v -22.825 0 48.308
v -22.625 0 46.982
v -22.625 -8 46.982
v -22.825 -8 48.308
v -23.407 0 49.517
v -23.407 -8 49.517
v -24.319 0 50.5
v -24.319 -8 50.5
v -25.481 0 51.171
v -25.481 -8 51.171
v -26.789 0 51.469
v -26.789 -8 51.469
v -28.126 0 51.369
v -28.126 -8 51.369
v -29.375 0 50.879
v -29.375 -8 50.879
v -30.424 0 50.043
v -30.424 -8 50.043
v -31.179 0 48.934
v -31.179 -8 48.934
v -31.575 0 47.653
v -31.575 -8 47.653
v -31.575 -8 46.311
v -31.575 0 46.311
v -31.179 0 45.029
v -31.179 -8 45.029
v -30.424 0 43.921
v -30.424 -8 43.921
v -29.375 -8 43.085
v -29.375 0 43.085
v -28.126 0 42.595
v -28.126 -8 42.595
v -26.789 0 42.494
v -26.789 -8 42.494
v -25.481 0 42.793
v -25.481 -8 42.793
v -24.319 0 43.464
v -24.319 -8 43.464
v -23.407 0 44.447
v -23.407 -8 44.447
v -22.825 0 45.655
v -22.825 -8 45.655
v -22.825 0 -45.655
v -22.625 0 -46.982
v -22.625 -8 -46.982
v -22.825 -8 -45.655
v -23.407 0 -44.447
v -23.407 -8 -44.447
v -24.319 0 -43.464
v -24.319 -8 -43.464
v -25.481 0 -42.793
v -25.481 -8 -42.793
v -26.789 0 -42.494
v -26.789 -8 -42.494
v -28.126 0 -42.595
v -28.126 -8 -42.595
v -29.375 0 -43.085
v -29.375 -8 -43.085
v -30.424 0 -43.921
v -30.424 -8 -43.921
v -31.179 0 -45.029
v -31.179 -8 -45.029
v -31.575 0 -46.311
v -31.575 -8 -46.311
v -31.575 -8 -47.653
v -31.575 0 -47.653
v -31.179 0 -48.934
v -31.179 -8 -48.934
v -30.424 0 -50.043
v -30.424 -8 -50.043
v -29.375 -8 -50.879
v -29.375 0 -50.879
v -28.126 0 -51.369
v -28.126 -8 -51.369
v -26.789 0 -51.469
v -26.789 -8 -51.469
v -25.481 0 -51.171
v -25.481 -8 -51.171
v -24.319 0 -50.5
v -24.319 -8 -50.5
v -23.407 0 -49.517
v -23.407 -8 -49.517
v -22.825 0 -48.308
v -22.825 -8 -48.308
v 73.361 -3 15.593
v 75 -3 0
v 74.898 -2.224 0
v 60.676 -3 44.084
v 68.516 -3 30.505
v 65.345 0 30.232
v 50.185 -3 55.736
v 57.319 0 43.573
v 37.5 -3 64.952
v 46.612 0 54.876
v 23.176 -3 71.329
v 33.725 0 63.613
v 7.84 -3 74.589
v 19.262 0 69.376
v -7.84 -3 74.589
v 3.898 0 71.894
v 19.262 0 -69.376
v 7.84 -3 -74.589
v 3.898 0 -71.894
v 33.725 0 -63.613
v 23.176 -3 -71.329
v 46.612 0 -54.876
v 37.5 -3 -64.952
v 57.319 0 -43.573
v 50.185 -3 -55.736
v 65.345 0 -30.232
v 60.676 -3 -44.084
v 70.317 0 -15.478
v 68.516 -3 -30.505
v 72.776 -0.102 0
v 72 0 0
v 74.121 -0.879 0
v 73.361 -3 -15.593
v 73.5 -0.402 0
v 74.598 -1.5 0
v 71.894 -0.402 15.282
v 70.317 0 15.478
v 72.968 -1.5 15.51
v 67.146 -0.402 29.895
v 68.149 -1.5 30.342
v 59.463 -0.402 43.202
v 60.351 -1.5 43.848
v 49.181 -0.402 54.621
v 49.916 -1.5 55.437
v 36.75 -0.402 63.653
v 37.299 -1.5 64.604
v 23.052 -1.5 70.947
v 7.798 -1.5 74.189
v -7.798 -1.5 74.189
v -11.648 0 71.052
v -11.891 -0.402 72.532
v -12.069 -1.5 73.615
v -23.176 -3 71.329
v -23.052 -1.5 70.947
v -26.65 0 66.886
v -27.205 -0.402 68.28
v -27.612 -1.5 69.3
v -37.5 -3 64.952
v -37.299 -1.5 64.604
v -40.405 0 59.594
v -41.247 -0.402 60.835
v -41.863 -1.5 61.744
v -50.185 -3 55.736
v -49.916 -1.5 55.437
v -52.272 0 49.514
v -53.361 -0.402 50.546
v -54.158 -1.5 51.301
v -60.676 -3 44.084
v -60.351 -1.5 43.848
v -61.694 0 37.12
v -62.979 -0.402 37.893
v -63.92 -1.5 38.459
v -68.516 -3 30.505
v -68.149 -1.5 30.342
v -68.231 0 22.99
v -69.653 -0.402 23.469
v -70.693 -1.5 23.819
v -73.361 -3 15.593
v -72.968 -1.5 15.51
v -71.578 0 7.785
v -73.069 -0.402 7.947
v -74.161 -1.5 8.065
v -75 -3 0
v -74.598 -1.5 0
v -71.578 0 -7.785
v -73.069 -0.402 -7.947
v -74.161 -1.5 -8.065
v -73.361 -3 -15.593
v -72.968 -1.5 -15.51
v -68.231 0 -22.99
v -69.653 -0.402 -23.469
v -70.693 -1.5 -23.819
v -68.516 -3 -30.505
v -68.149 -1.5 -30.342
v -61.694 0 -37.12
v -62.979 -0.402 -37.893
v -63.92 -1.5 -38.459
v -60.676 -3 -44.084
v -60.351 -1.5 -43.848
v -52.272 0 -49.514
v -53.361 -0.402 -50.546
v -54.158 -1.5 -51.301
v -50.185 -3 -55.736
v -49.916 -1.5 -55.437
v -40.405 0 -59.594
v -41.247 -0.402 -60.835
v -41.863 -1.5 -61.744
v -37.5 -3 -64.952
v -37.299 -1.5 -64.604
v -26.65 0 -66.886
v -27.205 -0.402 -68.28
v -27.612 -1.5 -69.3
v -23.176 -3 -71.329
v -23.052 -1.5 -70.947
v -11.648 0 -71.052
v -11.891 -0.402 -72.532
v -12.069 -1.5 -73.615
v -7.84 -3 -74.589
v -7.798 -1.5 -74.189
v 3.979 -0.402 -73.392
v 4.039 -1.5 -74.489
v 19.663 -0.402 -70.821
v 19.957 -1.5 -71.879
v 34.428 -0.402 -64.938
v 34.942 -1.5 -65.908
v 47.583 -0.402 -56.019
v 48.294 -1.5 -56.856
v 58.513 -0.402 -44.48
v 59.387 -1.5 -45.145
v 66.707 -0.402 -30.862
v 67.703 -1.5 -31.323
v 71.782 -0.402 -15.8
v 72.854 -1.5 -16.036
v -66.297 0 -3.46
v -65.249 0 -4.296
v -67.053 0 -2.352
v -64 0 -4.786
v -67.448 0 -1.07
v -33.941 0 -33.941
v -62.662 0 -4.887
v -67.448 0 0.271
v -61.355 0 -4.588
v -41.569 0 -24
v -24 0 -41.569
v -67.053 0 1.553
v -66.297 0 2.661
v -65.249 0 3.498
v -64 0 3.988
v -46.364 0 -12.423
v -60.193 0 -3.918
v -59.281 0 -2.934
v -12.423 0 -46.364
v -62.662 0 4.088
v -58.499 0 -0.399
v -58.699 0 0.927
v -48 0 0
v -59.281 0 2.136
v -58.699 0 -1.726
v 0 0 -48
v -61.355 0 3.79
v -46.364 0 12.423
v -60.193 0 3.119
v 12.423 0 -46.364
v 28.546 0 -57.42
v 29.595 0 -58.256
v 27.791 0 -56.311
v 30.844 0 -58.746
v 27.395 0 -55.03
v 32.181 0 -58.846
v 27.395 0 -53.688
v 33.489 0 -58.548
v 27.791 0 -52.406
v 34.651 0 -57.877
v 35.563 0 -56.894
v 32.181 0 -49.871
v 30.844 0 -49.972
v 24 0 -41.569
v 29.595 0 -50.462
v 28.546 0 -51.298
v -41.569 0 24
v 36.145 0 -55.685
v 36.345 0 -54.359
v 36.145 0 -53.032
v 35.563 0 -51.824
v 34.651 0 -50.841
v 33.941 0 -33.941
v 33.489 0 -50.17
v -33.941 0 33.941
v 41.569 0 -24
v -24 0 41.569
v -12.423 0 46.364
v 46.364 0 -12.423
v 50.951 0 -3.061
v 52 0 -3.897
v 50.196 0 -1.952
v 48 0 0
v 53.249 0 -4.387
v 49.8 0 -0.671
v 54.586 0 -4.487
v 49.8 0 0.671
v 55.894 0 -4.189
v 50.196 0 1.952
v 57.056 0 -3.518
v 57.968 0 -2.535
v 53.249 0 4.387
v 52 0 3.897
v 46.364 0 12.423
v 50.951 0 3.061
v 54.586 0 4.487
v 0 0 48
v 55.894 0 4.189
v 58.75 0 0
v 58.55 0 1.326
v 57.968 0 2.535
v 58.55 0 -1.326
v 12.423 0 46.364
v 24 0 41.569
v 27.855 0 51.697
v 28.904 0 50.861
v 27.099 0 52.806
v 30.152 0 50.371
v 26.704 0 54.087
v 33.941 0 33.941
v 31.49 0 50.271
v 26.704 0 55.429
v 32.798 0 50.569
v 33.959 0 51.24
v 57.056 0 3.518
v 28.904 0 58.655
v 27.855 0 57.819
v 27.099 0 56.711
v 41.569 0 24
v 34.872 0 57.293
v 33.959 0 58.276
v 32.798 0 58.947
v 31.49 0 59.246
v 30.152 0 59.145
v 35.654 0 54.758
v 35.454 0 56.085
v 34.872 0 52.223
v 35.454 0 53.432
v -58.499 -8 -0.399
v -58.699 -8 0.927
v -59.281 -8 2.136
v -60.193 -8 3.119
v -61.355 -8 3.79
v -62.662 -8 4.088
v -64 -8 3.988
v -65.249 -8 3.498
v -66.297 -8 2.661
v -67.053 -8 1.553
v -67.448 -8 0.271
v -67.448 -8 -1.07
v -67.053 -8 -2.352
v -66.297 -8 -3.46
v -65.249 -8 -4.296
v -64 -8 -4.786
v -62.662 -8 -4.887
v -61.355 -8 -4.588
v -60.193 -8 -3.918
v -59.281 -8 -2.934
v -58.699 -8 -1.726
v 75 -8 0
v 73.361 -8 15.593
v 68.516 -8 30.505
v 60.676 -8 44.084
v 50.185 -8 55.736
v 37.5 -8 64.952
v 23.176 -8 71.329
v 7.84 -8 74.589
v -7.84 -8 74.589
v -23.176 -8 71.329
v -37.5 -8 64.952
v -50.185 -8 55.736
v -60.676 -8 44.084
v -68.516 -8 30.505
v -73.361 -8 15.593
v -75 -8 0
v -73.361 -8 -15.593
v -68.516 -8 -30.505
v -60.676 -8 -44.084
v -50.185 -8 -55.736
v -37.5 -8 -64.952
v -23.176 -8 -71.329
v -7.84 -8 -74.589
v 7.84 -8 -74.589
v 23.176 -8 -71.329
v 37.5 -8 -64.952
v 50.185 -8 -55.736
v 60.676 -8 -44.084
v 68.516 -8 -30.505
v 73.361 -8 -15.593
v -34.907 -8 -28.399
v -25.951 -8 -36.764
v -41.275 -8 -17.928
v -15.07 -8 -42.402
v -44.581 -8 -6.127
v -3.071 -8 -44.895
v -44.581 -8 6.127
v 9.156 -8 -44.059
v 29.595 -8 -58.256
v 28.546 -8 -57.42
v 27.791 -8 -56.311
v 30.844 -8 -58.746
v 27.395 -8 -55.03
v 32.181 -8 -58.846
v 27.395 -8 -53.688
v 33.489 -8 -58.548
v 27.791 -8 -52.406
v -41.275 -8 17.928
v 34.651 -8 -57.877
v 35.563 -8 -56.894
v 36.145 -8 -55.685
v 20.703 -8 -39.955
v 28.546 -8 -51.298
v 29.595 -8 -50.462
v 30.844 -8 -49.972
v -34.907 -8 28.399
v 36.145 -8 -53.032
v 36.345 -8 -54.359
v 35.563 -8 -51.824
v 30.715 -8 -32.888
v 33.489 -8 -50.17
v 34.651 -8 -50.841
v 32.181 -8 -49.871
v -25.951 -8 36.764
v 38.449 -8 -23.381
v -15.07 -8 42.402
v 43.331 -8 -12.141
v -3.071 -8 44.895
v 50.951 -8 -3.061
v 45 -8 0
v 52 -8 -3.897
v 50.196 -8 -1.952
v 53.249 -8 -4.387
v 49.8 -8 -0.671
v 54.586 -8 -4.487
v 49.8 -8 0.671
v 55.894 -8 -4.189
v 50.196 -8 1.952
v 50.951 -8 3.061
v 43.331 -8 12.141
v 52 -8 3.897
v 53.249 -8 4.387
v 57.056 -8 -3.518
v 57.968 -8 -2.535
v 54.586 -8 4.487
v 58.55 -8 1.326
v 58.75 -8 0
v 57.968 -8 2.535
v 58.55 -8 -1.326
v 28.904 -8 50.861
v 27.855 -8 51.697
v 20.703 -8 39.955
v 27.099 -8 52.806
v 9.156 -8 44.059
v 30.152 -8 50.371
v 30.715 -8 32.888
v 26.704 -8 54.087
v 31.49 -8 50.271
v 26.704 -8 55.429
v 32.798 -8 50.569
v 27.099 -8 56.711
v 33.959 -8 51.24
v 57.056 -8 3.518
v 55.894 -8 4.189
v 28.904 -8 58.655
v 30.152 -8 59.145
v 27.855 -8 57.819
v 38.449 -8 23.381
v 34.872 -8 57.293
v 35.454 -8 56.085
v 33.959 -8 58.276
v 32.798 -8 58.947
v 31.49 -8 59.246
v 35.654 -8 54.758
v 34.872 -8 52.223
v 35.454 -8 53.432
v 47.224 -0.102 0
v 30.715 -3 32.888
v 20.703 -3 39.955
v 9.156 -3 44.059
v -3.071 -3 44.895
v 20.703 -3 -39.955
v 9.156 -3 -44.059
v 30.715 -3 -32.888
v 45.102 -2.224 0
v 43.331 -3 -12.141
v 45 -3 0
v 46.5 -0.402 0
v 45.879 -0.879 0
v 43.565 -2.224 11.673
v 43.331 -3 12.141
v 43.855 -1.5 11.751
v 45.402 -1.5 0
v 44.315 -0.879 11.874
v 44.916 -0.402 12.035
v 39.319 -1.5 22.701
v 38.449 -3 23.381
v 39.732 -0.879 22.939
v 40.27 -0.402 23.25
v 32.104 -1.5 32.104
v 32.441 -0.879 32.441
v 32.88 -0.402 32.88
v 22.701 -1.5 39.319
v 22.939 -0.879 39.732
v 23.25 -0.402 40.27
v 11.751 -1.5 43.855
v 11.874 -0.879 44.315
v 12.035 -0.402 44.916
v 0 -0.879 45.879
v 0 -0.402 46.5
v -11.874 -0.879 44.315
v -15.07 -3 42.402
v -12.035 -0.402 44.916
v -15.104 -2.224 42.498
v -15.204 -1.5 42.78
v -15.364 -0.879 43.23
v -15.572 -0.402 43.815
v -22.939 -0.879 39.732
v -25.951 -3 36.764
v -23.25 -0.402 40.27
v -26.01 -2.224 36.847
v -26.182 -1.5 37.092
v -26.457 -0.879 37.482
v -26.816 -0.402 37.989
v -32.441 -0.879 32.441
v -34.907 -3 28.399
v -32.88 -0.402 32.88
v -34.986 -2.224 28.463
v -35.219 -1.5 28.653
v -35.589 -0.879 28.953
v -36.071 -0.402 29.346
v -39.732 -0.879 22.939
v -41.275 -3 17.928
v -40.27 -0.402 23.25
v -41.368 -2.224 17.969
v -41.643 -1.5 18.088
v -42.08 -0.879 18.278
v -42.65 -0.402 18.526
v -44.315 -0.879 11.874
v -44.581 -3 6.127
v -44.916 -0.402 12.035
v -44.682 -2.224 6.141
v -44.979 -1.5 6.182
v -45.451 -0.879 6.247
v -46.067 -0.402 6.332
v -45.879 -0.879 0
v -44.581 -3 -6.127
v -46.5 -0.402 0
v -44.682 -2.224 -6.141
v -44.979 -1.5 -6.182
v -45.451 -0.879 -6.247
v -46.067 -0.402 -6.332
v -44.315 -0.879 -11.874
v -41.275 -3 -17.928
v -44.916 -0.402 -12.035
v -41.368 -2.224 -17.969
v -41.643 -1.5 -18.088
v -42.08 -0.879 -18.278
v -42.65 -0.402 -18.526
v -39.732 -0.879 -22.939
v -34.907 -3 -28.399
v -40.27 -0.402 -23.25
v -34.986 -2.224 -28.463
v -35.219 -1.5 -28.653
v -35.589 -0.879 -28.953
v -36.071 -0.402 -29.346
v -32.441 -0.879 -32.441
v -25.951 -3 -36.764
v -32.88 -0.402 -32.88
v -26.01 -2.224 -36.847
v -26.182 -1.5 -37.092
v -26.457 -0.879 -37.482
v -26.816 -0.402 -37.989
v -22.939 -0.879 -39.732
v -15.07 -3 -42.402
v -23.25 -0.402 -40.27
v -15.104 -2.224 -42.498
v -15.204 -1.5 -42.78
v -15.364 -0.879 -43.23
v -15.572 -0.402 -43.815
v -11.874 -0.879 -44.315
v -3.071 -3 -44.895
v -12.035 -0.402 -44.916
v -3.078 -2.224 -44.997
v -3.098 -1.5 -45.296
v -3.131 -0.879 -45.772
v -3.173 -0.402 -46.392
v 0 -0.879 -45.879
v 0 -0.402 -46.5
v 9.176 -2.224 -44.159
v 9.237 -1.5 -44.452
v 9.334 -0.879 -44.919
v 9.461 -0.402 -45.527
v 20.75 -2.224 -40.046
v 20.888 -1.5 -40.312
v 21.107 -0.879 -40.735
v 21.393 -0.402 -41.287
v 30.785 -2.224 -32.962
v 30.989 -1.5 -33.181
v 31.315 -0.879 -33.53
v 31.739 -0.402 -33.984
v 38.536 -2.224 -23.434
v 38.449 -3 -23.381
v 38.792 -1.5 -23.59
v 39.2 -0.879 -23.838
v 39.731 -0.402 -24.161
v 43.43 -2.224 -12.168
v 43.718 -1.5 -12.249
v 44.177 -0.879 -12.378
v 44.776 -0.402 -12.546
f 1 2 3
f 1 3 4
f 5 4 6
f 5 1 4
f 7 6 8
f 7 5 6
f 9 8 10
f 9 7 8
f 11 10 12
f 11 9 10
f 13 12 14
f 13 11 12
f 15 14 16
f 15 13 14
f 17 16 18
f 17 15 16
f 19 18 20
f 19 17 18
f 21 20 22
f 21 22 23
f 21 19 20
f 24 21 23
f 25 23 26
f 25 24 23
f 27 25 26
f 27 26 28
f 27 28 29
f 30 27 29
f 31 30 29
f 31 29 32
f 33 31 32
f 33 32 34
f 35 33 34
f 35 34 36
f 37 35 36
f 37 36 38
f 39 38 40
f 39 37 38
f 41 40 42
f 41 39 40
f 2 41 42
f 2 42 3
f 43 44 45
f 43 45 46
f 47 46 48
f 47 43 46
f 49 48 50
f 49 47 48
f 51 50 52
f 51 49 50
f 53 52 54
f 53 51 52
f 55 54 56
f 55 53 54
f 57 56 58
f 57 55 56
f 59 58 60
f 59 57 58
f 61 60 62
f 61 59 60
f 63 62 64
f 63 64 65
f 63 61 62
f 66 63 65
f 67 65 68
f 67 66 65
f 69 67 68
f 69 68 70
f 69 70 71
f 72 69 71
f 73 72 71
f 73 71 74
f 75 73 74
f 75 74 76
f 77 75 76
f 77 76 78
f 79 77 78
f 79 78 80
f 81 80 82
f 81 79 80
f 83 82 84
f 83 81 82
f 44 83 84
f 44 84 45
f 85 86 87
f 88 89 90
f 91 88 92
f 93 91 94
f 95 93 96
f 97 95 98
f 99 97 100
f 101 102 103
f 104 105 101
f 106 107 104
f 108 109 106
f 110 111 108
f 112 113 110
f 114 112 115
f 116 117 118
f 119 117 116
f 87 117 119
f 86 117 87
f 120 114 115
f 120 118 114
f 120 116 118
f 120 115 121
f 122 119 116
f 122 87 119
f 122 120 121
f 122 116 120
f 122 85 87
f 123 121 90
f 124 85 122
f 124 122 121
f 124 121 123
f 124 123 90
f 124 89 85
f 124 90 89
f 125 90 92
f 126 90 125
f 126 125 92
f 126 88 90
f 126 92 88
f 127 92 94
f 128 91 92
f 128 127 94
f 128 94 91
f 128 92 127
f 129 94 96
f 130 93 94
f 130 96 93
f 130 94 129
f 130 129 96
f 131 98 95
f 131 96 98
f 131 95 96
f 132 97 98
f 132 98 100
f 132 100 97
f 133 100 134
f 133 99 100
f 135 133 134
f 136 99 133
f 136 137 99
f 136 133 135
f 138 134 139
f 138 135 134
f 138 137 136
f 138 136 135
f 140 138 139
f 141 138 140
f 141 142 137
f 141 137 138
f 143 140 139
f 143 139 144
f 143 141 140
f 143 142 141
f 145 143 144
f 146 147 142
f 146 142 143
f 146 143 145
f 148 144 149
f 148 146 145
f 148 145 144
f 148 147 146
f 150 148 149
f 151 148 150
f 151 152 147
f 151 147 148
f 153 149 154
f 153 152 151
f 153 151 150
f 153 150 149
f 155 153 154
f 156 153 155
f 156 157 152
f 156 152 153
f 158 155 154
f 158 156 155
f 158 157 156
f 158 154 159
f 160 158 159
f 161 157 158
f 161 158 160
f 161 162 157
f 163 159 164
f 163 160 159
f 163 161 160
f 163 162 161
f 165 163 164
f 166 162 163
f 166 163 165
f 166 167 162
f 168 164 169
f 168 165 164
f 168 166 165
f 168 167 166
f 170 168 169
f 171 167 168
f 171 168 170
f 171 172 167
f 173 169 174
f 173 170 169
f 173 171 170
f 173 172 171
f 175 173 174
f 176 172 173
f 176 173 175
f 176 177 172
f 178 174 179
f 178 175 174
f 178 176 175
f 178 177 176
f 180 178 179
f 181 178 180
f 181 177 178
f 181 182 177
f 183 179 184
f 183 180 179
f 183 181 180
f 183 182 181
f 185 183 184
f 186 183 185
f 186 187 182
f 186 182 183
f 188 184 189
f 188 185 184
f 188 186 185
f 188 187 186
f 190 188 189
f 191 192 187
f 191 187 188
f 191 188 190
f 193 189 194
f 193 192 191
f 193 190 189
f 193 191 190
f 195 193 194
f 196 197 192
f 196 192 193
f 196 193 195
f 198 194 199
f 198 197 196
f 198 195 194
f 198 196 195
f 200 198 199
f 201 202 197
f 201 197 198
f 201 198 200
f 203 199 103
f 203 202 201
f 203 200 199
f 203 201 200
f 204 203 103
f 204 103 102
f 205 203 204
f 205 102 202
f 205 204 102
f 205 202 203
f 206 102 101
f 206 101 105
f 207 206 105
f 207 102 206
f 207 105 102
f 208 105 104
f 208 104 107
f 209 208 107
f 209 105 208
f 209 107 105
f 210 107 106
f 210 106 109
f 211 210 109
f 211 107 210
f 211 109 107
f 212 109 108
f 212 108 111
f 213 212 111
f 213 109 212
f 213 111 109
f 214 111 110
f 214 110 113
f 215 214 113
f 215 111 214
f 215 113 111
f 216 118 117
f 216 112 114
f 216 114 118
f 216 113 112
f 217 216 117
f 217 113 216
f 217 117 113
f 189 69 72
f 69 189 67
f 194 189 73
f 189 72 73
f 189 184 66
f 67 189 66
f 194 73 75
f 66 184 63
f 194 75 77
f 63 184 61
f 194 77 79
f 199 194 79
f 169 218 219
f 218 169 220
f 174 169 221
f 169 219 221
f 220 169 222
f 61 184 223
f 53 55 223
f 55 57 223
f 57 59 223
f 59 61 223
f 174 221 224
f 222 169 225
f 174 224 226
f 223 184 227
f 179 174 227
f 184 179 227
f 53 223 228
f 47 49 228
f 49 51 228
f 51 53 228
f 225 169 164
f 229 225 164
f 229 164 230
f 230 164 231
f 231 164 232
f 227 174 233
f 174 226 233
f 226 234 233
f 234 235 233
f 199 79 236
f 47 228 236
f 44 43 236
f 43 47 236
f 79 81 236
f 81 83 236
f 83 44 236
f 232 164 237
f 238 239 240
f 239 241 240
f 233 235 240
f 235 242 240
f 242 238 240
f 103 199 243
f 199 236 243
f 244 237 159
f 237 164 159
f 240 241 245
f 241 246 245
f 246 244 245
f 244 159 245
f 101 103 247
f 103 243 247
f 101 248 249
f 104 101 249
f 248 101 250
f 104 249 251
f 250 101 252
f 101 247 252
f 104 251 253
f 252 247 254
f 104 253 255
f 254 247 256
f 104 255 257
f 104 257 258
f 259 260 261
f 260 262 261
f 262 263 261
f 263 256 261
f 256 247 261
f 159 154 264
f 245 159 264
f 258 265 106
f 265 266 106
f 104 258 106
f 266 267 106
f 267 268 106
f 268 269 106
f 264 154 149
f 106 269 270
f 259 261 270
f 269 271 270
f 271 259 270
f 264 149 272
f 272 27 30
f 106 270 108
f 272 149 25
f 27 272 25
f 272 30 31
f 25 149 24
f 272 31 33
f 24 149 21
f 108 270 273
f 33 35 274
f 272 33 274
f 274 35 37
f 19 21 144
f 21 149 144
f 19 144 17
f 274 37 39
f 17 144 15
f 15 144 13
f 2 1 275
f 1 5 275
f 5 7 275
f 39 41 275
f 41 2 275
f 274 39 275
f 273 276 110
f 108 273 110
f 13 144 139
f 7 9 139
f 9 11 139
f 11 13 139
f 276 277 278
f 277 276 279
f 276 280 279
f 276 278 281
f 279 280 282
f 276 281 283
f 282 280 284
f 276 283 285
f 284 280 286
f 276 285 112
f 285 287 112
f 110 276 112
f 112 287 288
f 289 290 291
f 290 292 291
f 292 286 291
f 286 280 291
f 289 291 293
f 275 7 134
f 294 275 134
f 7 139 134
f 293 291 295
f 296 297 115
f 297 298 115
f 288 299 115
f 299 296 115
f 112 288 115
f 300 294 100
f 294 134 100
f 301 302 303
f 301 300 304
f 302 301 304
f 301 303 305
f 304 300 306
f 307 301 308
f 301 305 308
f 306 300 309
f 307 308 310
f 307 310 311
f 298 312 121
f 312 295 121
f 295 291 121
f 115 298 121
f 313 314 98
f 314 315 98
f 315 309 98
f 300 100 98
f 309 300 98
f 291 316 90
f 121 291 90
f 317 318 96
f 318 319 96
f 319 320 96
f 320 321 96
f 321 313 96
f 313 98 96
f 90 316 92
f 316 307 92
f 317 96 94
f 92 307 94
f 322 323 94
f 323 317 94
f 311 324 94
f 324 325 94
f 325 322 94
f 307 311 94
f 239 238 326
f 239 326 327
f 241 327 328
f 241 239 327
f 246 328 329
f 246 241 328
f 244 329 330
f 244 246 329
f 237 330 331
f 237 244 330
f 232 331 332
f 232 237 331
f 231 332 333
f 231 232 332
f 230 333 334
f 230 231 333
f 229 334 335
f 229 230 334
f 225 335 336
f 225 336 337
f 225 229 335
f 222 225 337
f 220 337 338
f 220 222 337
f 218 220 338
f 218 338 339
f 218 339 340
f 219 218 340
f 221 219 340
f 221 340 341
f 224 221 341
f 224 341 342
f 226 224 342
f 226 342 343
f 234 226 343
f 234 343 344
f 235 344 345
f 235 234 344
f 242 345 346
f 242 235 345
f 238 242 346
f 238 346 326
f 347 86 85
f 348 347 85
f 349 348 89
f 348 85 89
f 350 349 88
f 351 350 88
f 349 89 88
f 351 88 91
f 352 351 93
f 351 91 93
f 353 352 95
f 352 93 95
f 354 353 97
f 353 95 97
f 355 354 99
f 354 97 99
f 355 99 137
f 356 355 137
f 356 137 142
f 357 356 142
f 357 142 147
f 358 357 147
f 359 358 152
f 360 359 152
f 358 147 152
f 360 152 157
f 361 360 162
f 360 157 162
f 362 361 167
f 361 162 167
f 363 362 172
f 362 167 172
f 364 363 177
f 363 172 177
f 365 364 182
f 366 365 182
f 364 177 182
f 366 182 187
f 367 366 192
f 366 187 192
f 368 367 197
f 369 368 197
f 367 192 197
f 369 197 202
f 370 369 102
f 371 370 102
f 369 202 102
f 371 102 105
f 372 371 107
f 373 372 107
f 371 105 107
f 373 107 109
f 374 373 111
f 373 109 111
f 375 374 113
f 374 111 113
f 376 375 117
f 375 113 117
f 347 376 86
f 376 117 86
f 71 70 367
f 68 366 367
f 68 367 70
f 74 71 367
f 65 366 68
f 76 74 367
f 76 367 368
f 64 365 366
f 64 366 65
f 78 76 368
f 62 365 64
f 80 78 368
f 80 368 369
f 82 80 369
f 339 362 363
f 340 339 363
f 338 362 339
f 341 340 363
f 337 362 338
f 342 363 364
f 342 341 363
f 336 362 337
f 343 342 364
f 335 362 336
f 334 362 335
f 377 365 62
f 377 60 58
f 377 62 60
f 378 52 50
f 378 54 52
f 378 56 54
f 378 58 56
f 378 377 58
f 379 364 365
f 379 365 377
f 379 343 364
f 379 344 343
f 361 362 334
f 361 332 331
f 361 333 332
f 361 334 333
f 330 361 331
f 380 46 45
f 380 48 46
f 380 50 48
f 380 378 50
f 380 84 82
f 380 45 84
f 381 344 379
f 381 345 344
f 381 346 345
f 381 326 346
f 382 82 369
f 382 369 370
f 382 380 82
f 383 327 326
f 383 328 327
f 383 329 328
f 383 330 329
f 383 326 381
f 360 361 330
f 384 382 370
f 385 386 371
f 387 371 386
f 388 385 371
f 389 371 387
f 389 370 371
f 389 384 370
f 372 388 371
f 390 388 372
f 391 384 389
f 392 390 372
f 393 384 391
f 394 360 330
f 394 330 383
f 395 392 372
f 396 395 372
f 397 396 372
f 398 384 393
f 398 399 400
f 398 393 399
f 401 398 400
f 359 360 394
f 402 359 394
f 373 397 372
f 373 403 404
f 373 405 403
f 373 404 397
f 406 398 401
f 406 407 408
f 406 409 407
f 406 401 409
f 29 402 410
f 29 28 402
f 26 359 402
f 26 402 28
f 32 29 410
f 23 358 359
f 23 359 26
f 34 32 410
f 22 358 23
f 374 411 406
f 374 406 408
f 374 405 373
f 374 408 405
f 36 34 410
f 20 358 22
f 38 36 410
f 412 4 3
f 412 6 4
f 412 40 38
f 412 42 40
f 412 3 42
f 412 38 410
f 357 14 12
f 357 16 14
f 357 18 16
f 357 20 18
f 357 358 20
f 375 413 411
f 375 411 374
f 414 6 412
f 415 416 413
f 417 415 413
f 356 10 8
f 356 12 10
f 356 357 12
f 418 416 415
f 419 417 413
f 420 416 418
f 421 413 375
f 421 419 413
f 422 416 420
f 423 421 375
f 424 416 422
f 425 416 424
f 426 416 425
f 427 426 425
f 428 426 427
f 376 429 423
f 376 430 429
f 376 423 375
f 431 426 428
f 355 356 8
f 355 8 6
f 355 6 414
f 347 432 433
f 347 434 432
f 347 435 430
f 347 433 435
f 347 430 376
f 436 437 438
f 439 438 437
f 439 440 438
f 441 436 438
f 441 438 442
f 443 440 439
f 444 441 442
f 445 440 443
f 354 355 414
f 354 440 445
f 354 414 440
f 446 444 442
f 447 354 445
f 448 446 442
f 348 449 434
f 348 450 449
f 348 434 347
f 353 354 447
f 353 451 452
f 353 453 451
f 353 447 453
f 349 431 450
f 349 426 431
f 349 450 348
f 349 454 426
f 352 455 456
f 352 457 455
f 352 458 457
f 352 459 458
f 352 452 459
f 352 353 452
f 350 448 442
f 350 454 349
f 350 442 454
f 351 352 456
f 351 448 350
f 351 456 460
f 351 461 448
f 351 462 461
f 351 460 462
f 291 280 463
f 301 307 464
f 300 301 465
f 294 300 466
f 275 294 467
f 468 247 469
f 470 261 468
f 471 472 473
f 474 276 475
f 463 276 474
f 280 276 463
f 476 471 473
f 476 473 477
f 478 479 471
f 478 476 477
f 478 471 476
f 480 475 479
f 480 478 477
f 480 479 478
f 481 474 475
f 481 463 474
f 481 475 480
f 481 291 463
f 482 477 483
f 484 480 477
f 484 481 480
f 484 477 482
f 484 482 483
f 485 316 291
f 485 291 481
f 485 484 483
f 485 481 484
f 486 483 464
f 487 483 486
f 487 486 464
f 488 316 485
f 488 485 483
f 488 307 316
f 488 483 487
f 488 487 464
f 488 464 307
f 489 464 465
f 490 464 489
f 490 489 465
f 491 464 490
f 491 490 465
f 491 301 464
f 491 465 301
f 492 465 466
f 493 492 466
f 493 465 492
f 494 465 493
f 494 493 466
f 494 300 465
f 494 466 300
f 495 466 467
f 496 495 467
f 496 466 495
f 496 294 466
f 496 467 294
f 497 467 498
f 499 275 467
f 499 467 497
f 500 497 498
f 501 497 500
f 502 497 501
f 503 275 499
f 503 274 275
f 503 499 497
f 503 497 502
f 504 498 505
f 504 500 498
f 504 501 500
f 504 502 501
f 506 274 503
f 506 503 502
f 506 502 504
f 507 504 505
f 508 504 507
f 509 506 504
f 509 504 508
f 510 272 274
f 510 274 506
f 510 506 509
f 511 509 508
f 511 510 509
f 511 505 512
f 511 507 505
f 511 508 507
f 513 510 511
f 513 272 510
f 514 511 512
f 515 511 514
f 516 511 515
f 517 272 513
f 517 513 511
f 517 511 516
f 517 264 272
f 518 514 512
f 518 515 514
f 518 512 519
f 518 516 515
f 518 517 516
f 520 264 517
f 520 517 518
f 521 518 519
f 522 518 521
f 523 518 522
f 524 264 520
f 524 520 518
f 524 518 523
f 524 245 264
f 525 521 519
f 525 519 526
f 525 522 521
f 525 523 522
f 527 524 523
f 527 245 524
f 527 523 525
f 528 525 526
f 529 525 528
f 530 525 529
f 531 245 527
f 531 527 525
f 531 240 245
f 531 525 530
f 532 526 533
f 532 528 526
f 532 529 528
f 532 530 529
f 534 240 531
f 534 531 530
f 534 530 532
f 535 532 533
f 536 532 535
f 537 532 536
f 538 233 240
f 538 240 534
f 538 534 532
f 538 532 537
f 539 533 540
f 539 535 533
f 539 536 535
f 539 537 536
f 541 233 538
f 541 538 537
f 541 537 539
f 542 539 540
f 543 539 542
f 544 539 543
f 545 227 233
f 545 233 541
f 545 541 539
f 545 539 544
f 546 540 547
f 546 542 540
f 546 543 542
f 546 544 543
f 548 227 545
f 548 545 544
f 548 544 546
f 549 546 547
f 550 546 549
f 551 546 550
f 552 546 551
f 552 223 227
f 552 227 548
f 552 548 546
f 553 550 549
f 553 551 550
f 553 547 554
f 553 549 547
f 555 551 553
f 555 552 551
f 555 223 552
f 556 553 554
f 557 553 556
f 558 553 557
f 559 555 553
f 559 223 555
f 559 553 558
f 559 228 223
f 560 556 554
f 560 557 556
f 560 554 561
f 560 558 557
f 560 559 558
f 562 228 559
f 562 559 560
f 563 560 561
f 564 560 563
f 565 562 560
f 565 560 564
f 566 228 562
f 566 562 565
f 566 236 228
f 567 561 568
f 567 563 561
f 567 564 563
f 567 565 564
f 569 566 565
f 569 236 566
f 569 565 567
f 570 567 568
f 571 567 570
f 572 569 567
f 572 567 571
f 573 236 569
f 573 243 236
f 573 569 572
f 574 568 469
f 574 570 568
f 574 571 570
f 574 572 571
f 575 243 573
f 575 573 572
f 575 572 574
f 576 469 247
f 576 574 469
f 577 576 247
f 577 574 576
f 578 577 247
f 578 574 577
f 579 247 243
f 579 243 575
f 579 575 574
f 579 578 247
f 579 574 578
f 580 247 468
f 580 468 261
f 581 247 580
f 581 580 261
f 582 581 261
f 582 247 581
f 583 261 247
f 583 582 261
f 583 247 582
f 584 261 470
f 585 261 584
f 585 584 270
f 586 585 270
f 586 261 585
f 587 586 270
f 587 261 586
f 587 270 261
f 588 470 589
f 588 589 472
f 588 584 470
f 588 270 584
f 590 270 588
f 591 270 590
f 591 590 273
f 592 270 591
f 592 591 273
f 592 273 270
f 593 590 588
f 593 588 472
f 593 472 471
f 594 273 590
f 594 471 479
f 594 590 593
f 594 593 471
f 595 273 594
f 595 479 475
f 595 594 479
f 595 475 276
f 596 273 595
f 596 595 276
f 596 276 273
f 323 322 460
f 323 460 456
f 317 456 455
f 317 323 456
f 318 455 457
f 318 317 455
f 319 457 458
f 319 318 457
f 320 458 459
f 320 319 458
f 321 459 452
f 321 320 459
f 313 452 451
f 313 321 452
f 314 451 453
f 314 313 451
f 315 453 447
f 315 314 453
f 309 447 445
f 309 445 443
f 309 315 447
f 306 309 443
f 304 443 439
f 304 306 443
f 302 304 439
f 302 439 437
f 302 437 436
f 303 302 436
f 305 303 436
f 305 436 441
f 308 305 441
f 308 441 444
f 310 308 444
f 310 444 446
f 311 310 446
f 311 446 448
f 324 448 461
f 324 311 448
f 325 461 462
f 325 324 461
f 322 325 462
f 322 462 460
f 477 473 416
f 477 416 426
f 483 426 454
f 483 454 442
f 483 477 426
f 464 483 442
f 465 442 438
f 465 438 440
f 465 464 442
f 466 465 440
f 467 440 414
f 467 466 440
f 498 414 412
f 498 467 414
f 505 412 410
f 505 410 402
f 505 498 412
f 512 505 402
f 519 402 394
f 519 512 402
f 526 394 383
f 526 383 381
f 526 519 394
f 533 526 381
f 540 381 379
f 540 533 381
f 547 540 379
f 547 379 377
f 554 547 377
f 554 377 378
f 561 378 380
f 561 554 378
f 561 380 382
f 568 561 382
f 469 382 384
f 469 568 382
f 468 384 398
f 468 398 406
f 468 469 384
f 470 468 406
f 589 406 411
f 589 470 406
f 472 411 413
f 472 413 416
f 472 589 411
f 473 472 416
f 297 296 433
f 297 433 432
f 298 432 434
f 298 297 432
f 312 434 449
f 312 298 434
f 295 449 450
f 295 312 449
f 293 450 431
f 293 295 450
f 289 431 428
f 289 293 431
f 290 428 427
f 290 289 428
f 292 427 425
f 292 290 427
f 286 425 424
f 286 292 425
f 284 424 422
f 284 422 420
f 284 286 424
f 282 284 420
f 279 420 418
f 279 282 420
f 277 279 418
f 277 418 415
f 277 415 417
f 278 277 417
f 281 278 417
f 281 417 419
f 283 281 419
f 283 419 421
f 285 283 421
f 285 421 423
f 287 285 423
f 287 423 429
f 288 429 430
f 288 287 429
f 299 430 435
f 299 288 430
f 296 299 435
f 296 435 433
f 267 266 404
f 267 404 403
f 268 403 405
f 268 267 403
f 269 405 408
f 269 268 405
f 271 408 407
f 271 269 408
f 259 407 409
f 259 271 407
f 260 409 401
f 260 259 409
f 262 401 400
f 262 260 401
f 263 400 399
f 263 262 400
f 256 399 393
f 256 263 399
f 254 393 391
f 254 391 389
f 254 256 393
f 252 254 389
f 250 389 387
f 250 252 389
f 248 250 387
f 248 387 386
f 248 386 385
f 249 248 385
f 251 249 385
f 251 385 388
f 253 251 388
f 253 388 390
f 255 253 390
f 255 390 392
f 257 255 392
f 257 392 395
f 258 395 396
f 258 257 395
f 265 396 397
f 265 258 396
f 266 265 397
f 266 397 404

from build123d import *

# Parameters (mm, degrees)
F0_R     = 75
F0_R_2   = 4.5
F0_R_3   = 45
F1_DEPTH = 8
F2_R     = 3
F3_R     = 3


with BuildPart() as f1:
    # F0 (on Front) → F1 (new body)
    with BuildSketch(Plane.XZ):
        Circle(F0_R)
        with Locations((-27.125, -46.981878)):
            Circle(F0_R_2, mode=Mode.SUBTRACT)
        with Locations((-62.998735, -0.399298)):
            Circle(F0_R_2, mode=Mode.SUBTRACT)
        with Locations((31.84517, -54.358856)):
            Circle(F0_R_2, mode=Mode.SUBTRACT)
        with Locations((-27.125, 46.981878)):
            Circle(F0_R_2, mode=Mode.SUBTRACT)
        Circle(F0_R_3, mode=Mode.SUBTRACT)
        with Locations((54.25, 0)):
            Circle(F0_R_2, mode=Mode.SUBTRACT)
        with Locations((31.153565, 54.758154)):
            Circle(F0_R_2, mode=Mode.SUBTRACT)
    extrude(amount=F1_DEPTH)

    # F2
    f2_edges = [f1.edges().sort_by_distance(p)[0] for p in [
        (-45, 0, 0),
    ]]
    fillet(f2_edges, radius=F2_R)

    # F3
    f3_edges = [f1.edges().sort_by_distance(p)[0] for p in [
        (-75, 0, 0),
    ]]
    fillet(f3_edges, radius=F3_R)


solid = f1.part
